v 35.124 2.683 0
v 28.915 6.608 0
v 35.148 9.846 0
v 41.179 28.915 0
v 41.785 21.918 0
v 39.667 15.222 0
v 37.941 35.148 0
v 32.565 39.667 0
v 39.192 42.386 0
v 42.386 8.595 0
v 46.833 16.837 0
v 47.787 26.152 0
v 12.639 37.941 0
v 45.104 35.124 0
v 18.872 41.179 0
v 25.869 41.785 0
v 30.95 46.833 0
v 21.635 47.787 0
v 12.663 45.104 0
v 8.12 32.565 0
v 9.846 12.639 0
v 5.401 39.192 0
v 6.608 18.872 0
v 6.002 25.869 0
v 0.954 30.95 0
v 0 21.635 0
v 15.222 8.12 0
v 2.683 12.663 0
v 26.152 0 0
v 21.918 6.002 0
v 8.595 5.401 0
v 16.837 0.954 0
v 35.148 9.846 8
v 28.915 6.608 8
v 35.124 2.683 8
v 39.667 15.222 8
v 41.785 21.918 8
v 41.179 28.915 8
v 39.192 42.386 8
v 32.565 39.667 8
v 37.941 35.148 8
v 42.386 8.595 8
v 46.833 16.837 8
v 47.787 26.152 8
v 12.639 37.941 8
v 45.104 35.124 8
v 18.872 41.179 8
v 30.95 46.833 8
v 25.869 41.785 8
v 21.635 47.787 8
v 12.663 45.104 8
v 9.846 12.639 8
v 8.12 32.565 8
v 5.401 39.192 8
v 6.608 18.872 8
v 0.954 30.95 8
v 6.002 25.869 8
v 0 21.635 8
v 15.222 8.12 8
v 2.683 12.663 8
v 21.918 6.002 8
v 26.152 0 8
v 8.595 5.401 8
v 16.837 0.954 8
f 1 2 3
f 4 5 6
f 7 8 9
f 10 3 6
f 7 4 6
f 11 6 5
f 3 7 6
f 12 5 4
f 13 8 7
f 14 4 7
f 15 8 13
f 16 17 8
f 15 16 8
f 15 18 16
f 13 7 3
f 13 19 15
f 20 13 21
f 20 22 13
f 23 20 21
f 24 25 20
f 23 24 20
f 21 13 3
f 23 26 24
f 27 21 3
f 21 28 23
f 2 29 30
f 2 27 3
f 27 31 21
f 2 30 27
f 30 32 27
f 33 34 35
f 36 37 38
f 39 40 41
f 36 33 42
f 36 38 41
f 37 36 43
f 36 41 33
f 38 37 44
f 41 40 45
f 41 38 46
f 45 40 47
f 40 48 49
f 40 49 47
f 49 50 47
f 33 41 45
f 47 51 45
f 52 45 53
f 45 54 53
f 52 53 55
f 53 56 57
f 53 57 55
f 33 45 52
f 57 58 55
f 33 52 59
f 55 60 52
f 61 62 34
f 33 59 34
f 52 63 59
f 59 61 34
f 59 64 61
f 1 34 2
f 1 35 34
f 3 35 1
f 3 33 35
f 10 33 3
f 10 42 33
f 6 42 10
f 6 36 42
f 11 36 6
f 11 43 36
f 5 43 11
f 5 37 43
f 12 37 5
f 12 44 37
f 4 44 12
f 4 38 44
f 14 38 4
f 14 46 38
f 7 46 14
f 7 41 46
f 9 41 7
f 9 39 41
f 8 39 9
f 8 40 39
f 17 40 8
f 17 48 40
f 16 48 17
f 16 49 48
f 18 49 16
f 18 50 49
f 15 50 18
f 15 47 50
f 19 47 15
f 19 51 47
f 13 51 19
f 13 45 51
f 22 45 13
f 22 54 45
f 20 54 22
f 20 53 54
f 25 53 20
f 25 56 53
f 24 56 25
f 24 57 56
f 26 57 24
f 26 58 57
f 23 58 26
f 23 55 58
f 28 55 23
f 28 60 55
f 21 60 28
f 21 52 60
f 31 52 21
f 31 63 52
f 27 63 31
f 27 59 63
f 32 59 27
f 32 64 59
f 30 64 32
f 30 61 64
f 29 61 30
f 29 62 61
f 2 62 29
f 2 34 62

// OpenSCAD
$fn = 32;

// ----------------------------------------------------------------------
// Chain sprocket: 16 teeth, 18 mm root radius
// ----------------------------------------------------------------------

// --- parameters (mm) ---
profile_height = 8;       // extrusion height
profile_points = 32;      // points of the closed outline

profile = [[41.785, 21.918], [47.787, 26.152], [41.179, 28.915], [45.104, 35.124], [37.941, 35.148], [39.192, 42.386], [32.565, 39.667], [30.95, 46.833], [25.869, 41.785], [21.635, 47.787], [18.872, 41.179], [12.663, 45.104], [12.639, 37.941], [5.401, 39.192], [8.12, 32.565], [0.954, 30.95], [6.002, 25.869], [0, 21.635], [6.608, 18.872], [2.683, 12.663], [9.846, 12.639], [8.595, 5.401], [15.222, 8.12], [16.837, 0.954], [21.918, 6.002], [26.152, 0], [28.915, 6.608], [35.124, 2.683], [35.148, 9.846], [42.386, 8.595], [39.667, 15.222], [46.833, 16.837]];  // single closed polygon, 32 points, counter clockwise

// --- the one profile operation ---
linear_extrude(height = profile_height) polygon(points = profile);
